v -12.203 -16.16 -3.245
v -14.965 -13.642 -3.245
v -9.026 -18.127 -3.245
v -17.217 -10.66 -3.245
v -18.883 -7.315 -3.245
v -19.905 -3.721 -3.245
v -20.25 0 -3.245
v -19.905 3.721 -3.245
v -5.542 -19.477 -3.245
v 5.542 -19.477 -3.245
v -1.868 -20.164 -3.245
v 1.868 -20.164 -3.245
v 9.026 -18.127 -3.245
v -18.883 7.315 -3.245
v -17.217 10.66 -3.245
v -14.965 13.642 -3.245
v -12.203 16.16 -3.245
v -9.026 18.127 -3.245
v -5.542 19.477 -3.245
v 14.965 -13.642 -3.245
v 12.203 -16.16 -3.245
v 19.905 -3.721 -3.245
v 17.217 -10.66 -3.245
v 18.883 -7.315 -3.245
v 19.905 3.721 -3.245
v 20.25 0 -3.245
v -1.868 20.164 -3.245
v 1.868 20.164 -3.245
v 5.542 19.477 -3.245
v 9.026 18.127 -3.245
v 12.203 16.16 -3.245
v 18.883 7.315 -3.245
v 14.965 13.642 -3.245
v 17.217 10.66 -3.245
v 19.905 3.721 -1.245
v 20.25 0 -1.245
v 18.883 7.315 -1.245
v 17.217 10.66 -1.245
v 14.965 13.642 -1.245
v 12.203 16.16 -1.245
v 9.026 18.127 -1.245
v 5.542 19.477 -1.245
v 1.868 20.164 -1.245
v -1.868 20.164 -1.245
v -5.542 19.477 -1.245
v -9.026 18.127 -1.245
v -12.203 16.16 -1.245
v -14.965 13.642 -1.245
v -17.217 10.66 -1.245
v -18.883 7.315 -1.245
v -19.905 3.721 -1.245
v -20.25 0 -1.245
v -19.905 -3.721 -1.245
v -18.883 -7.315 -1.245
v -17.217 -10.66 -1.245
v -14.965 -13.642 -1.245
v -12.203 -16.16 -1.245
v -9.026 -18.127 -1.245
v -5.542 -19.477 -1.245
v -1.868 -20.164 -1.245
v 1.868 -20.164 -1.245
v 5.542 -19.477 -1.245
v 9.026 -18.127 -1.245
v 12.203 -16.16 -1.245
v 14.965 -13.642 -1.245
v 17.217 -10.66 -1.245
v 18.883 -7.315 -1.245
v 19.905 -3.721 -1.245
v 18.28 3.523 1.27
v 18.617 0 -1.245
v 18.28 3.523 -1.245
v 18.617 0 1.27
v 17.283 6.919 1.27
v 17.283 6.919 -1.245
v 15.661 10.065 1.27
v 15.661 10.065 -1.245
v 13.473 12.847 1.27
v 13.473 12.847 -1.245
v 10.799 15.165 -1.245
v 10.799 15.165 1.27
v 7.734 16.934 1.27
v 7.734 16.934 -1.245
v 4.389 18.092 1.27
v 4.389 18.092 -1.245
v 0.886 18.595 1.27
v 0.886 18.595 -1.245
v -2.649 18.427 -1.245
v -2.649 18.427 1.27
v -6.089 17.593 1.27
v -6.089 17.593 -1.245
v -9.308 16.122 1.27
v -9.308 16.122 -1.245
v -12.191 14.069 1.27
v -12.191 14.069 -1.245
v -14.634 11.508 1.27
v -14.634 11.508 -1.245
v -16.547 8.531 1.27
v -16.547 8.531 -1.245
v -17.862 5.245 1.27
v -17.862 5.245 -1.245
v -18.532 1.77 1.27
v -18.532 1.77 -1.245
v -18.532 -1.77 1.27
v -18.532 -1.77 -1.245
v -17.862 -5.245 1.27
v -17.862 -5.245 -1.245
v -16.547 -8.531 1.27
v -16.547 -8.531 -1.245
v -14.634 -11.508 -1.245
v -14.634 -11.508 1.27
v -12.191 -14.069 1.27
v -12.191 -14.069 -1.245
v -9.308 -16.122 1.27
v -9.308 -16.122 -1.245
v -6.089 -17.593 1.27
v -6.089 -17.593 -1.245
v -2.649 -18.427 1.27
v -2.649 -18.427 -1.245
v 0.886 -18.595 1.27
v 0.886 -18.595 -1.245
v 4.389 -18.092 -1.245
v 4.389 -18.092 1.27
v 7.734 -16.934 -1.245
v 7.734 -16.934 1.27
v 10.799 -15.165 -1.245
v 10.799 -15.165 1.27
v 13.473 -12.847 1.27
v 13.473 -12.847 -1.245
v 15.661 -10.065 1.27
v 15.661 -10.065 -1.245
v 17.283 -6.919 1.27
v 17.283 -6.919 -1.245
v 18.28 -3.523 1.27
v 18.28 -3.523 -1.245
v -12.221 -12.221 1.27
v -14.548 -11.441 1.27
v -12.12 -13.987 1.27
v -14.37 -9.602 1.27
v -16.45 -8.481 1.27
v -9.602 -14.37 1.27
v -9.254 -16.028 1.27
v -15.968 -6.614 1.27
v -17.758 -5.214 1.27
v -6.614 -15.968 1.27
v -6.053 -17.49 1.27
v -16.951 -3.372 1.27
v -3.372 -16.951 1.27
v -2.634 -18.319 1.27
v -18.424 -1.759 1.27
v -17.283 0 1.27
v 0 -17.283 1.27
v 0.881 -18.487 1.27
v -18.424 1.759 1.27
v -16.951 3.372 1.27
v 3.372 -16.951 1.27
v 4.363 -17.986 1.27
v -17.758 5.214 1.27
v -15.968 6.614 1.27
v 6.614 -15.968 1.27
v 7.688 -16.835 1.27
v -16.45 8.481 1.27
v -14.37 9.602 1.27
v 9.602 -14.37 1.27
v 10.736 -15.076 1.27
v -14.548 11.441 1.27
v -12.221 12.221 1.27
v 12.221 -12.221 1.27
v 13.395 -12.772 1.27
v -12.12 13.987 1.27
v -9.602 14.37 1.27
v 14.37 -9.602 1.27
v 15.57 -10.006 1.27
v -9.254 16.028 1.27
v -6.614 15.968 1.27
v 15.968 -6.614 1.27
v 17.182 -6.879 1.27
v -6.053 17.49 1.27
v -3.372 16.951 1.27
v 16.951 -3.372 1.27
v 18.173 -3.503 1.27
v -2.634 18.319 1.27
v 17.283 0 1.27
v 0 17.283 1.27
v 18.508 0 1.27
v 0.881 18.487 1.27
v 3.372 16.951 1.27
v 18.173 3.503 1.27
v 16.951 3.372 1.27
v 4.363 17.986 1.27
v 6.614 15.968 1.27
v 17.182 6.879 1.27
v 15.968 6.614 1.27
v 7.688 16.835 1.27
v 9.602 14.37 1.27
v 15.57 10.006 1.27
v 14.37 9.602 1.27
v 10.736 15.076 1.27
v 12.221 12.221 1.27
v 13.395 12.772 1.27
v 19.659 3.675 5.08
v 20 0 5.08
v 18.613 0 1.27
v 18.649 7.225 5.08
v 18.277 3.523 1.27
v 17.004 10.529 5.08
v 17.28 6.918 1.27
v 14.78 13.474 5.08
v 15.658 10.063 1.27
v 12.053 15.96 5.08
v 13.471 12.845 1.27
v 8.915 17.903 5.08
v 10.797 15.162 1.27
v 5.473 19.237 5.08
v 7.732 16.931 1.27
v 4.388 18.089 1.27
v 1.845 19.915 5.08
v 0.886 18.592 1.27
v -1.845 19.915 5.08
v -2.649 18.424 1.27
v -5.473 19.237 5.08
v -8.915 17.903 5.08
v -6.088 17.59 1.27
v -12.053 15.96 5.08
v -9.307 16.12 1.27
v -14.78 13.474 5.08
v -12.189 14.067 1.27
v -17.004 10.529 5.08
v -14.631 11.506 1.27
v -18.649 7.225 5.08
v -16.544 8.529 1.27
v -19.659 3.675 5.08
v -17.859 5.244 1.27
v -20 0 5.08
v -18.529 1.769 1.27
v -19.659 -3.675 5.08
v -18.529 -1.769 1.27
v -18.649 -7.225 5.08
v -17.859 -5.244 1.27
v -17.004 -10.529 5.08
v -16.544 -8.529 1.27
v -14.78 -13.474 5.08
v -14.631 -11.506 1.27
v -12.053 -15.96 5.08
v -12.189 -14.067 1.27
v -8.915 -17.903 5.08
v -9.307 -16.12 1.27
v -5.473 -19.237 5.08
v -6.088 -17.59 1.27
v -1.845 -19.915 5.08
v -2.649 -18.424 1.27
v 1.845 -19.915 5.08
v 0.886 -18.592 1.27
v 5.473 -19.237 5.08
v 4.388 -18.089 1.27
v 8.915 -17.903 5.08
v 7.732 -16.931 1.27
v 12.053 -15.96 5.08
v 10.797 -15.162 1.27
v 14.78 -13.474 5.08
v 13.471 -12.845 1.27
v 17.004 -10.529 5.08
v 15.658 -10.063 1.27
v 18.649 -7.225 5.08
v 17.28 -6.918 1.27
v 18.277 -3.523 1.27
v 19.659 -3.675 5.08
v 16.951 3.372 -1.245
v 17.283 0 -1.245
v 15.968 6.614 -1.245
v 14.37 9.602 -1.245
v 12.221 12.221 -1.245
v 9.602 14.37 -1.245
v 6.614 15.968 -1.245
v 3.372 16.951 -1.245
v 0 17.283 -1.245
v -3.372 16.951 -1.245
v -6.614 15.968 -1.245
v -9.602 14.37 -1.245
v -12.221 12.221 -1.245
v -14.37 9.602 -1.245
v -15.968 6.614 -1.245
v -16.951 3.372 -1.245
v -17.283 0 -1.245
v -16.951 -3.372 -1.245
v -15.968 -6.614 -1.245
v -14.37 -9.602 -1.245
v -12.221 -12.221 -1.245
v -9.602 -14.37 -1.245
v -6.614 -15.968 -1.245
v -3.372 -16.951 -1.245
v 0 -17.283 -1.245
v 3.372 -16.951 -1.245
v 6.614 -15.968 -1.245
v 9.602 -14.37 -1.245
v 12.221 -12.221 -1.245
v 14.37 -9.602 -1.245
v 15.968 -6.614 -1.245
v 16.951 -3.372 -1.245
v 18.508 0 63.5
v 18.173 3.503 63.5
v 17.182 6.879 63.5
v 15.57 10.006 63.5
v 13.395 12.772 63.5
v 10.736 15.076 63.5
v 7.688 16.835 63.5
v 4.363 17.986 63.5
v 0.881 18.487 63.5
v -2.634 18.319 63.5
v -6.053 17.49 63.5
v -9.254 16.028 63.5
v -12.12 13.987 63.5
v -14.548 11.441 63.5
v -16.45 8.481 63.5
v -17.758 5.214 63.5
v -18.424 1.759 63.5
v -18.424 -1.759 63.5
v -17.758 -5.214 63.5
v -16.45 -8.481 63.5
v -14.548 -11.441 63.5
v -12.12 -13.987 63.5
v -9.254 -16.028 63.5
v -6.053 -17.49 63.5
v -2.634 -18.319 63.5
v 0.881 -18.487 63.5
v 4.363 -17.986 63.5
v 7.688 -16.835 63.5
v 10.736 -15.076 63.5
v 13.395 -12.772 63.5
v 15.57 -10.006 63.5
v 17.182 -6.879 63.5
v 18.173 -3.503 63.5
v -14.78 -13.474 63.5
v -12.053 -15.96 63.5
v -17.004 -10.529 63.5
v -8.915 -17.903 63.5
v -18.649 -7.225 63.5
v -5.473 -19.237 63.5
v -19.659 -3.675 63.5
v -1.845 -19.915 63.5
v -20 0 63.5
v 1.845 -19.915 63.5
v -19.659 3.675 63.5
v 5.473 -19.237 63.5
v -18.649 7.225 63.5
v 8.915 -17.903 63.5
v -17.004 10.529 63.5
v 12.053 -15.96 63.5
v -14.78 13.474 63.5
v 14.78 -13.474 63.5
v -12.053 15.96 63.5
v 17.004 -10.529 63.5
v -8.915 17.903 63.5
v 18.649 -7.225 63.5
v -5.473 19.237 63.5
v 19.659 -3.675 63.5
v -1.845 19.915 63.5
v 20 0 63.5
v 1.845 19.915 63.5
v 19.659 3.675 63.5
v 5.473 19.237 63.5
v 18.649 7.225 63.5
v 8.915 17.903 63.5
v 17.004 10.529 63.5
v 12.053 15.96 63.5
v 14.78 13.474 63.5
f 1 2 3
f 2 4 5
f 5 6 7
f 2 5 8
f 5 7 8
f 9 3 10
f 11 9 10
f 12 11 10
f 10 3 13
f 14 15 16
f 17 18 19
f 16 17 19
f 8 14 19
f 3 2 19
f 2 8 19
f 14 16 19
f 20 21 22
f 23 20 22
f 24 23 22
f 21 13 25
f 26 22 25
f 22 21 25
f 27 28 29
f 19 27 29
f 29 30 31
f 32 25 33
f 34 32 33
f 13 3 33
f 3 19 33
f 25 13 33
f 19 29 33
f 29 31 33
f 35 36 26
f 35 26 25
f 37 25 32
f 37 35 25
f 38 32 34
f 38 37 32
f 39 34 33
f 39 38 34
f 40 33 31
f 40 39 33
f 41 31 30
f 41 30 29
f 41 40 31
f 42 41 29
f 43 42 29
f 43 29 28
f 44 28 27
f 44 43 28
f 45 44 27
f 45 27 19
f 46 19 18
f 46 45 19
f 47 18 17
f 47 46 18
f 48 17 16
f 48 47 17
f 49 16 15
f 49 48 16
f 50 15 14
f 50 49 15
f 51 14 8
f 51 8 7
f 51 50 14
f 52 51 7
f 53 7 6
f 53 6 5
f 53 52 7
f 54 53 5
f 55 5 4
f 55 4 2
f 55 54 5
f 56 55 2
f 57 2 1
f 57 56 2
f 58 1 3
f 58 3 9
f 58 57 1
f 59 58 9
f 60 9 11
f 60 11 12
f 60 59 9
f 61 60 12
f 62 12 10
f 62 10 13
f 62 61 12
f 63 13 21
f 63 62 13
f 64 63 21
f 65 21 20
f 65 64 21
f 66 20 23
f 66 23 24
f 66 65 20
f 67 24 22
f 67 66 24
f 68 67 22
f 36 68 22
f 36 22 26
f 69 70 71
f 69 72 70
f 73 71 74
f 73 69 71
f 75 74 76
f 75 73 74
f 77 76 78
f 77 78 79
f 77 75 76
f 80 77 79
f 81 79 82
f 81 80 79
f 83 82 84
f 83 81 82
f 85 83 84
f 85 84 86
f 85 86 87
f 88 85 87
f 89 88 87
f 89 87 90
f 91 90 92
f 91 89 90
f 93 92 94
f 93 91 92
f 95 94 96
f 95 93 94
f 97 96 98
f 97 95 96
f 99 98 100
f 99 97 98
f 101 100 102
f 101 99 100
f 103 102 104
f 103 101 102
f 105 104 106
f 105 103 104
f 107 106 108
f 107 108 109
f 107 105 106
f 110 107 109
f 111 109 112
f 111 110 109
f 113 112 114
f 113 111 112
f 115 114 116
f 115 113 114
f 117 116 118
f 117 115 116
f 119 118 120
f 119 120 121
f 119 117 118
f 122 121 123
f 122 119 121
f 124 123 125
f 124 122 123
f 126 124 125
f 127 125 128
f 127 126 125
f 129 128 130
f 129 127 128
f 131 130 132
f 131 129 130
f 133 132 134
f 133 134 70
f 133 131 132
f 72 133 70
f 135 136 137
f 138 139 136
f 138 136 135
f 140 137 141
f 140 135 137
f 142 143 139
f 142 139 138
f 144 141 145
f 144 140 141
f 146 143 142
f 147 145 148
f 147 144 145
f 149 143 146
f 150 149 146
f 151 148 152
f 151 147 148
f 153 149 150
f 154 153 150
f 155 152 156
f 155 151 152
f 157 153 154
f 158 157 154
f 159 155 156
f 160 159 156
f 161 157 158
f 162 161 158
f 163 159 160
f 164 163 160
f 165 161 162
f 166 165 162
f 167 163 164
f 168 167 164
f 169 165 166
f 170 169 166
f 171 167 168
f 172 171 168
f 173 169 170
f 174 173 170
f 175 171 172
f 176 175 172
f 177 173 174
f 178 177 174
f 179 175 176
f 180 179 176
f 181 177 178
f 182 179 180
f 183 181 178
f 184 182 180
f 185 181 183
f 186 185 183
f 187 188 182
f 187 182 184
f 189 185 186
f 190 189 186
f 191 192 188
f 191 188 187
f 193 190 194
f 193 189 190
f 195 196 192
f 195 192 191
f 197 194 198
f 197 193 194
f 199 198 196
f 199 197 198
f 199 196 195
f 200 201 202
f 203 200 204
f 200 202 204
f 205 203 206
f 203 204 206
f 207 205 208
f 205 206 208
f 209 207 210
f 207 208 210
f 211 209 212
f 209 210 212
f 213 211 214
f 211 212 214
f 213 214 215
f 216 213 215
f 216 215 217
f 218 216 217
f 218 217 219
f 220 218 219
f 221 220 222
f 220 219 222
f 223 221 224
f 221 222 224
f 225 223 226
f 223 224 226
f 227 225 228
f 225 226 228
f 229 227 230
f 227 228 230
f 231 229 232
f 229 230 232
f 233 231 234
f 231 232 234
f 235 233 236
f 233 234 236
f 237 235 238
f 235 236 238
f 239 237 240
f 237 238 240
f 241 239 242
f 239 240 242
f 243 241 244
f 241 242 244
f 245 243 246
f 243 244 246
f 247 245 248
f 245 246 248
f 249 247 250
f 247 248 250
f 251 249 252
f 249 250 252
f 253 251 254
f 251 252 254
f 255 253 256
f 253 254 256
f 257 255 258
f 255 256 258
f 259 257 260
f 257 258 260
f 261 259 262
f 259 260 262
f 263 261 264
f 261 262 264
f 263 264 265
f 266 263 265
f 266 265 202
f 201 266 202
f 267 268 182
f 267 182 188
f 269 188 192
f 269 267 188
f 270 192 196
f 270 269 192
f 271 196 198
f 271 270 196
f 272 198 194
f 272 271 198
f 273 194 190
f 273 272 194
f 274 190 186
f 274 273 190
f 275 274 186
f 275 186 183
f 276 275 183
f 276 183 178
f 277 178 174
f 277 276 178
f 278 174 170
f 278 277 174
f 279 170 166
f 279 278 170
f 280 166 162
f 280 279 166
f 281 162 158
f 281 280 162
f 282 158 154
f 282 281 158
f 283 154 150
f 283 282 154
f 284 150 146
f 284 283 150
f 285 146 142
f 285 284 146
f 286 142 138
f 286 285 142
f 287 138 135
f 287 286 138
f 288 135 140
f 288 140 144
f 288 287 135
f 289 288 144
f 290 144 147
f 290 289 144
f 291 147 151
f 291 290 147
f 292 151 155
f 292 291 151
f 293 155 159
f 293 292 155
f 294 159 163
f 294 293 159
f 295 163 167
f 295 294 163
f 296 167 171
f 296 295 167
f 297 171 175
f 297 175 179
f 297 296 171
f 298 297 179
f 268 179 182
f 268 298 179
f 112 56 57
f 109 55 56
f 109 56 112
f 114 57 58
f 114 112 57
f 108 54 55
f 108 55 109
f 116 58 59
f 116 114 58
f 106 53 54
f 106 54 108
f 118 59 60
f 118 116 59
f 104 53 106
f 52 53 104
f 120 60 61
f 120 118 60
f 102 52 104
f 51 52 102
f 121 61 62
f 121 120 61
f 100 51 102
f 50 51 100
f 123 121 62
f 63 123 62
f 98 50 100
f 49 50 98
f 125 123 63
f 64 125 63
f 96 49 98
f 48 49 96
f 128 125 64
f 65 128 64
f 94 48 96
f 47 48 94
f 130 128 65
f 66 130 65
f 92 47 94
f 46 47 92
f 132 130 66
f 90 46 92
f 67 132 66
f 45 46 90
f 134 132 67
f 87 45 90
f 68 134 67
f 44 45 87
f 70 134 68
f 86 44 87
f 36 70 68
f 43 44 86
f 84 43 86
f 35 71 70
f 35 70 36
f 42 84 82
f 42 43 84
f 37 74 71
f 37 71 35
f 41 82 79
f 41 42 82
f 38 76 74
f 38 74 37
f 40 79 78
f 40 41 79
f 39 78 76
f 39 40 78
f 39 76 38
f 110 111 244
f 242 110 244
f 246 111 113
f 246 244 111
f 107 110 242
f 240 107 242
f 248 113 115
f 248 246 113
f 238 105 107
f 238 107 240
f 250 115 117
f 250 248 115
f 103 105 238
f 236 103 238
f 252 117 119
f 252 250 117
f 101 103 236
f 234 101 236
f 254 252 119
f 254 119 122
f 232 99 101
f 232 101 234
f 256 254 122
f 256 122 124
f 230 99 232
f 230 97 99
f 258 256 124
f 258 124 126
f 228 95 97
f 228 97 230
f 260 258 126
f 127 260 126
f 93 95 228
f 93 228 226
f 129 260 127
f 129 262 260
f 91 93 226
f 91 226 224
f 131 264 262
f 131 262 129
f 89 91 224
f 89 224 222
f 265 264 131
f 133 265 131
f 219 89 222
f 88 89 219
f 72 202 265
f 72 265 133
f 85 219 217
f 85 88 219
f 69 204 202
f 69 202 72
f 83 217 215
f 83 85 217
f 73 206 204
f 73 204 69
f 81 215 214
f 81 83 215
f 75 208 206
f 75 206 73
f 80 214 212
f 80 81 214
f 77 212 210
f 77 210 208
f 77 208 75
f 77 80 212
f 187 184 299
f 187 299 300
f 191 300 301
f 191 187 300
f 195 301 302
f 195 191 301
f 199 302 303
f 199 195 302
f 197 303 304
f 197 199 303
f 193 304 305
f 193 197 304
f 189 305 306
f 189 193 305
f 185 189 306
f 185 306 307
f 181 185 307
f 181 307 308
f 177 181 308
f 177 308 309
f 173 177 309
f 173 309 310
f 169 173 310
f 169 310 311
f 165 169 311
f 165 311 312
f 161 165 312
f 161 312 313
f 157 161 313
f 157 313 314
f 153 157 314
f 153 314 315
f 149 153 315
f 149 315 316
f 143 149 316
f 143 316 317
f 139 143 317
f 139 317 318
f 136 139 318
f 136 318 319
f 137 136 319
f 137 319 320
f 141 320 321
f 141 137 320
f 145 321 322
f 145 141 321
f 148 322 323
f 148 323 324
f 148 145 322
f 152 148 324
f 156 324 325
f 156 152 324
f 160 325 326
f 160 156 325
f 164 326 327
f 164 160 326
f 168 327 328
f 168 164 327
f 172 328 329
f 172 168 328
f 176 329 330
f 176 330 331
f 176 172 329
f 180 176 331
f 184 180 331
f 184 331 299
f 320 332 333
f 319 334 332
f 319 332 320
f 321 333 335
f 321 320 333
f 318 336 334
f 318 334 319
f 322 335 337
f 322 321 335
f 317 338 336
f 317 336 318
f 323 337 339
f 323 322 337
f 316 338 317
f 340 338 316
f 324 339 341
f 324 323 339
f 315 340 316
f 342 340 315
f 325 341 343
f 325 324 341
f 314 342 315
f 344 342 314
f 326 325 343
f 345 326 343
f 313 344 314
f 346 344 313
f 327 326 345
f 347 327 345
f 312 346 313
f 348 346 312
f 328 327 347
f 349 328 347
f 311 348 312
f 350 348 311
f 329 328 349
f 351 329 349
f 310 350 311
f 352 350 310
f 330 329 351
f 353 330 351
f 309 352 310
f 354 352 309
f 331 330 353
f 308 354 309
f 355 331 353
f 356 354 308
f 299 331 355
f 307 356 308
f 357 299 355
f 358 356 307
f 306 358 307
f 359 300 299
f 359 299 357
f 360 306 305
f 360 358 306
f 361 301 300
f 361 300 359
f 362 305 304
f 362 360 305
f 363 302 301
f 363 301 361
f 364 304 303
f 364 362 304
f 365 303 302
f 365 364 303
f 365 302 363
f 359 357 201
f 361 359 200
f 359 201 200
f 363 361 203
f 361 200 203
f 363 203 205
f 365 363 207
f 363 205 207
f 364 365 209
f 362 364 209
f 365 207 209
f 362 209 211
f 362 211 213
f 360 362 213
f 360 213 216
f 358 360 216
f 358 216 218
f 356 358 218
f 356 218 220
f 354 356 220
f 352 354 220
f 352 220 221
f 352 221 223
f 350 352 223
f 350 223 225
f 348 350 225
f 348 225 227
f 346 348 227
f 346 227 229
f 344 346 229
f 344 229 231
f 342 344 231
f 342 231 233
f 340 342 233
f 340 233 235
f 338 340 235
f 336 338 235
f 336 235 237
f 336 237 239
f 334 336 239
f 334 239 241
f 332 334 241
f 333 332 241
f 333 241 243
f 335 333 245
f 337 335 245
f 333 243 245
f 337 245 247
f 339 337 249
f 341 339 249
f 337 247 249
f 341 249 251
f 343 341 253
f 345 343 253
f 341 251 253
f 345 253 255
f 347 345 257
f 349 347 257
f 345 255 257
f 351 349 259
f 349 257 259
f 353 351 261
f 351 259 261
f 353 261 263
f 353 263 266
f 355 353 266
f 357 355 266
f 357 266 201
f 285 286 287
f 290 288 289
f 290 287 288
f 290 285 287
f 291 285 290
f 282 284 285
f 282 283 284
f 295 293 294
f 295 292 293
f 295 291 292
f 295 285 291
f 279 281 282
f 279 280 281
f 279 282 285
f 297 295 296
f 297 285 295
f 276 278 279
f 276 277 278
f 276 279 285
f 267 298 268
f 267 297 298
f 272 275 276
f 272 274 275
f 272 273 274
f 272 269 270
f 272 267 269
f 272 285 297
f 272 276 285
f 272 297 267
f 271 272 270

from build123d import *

# Parameters (mm, degrees)
F0_R     = 20
F0_R_2   = 18.5078276758
F1_DEPTH = 63.5
F3_R     = 18.6165604835
F3_R_2   = 17.2832490894
F4_DEPTH = 1.27
F6_R     = 20.25
F7_DEPTH = 2


# Not quite as in the source:
# - a fillet or chamfer that OpenCascade refuses, or shapes differently, is made with other operations: its cross-section is extruded or revolved along the edge and cut away or added


with BuildPart() as f1:
    # F0 (on Top) → F1 (new body)
    with BuildSketch(Plane.XY):
        Circle(F0_R)
        Circle(F0_R_2, mode=Mode.SUBTRACT)
    extrude(amount=F1_DEPTH)

    # F2: chamfer of 5.08 x 1.8489687901 on 1 edges, made by hand

    # F2_s1 → F2_t2 (revolve, cut)
    with BuildSketch(Plane.XZ):
        Polygon((20, 5.08), (18.1510312099, 0), (20, 0), align=None)
    revolve(axis=Axis((0, 0, 0), (0, 0, 1)), mode=Mode.SUBTRACT)

    # F3 (on Top) → F4 (join, symmetric)
    with BuildSketch(Plane.XY):
        Circle(F3_R)
        Circle(F3_R_2, mode=Mode.SUBTRACT)
    extrude(amount=F4_DEPTH, both=True)

    # F6 (on offset) → F7 (join)
    with BuildSketch(Plane.XY.offset(-1.2446)):
        Circle(F6_R)
    extrude(amount=-F7_DEPTH)


solid = f1.part
